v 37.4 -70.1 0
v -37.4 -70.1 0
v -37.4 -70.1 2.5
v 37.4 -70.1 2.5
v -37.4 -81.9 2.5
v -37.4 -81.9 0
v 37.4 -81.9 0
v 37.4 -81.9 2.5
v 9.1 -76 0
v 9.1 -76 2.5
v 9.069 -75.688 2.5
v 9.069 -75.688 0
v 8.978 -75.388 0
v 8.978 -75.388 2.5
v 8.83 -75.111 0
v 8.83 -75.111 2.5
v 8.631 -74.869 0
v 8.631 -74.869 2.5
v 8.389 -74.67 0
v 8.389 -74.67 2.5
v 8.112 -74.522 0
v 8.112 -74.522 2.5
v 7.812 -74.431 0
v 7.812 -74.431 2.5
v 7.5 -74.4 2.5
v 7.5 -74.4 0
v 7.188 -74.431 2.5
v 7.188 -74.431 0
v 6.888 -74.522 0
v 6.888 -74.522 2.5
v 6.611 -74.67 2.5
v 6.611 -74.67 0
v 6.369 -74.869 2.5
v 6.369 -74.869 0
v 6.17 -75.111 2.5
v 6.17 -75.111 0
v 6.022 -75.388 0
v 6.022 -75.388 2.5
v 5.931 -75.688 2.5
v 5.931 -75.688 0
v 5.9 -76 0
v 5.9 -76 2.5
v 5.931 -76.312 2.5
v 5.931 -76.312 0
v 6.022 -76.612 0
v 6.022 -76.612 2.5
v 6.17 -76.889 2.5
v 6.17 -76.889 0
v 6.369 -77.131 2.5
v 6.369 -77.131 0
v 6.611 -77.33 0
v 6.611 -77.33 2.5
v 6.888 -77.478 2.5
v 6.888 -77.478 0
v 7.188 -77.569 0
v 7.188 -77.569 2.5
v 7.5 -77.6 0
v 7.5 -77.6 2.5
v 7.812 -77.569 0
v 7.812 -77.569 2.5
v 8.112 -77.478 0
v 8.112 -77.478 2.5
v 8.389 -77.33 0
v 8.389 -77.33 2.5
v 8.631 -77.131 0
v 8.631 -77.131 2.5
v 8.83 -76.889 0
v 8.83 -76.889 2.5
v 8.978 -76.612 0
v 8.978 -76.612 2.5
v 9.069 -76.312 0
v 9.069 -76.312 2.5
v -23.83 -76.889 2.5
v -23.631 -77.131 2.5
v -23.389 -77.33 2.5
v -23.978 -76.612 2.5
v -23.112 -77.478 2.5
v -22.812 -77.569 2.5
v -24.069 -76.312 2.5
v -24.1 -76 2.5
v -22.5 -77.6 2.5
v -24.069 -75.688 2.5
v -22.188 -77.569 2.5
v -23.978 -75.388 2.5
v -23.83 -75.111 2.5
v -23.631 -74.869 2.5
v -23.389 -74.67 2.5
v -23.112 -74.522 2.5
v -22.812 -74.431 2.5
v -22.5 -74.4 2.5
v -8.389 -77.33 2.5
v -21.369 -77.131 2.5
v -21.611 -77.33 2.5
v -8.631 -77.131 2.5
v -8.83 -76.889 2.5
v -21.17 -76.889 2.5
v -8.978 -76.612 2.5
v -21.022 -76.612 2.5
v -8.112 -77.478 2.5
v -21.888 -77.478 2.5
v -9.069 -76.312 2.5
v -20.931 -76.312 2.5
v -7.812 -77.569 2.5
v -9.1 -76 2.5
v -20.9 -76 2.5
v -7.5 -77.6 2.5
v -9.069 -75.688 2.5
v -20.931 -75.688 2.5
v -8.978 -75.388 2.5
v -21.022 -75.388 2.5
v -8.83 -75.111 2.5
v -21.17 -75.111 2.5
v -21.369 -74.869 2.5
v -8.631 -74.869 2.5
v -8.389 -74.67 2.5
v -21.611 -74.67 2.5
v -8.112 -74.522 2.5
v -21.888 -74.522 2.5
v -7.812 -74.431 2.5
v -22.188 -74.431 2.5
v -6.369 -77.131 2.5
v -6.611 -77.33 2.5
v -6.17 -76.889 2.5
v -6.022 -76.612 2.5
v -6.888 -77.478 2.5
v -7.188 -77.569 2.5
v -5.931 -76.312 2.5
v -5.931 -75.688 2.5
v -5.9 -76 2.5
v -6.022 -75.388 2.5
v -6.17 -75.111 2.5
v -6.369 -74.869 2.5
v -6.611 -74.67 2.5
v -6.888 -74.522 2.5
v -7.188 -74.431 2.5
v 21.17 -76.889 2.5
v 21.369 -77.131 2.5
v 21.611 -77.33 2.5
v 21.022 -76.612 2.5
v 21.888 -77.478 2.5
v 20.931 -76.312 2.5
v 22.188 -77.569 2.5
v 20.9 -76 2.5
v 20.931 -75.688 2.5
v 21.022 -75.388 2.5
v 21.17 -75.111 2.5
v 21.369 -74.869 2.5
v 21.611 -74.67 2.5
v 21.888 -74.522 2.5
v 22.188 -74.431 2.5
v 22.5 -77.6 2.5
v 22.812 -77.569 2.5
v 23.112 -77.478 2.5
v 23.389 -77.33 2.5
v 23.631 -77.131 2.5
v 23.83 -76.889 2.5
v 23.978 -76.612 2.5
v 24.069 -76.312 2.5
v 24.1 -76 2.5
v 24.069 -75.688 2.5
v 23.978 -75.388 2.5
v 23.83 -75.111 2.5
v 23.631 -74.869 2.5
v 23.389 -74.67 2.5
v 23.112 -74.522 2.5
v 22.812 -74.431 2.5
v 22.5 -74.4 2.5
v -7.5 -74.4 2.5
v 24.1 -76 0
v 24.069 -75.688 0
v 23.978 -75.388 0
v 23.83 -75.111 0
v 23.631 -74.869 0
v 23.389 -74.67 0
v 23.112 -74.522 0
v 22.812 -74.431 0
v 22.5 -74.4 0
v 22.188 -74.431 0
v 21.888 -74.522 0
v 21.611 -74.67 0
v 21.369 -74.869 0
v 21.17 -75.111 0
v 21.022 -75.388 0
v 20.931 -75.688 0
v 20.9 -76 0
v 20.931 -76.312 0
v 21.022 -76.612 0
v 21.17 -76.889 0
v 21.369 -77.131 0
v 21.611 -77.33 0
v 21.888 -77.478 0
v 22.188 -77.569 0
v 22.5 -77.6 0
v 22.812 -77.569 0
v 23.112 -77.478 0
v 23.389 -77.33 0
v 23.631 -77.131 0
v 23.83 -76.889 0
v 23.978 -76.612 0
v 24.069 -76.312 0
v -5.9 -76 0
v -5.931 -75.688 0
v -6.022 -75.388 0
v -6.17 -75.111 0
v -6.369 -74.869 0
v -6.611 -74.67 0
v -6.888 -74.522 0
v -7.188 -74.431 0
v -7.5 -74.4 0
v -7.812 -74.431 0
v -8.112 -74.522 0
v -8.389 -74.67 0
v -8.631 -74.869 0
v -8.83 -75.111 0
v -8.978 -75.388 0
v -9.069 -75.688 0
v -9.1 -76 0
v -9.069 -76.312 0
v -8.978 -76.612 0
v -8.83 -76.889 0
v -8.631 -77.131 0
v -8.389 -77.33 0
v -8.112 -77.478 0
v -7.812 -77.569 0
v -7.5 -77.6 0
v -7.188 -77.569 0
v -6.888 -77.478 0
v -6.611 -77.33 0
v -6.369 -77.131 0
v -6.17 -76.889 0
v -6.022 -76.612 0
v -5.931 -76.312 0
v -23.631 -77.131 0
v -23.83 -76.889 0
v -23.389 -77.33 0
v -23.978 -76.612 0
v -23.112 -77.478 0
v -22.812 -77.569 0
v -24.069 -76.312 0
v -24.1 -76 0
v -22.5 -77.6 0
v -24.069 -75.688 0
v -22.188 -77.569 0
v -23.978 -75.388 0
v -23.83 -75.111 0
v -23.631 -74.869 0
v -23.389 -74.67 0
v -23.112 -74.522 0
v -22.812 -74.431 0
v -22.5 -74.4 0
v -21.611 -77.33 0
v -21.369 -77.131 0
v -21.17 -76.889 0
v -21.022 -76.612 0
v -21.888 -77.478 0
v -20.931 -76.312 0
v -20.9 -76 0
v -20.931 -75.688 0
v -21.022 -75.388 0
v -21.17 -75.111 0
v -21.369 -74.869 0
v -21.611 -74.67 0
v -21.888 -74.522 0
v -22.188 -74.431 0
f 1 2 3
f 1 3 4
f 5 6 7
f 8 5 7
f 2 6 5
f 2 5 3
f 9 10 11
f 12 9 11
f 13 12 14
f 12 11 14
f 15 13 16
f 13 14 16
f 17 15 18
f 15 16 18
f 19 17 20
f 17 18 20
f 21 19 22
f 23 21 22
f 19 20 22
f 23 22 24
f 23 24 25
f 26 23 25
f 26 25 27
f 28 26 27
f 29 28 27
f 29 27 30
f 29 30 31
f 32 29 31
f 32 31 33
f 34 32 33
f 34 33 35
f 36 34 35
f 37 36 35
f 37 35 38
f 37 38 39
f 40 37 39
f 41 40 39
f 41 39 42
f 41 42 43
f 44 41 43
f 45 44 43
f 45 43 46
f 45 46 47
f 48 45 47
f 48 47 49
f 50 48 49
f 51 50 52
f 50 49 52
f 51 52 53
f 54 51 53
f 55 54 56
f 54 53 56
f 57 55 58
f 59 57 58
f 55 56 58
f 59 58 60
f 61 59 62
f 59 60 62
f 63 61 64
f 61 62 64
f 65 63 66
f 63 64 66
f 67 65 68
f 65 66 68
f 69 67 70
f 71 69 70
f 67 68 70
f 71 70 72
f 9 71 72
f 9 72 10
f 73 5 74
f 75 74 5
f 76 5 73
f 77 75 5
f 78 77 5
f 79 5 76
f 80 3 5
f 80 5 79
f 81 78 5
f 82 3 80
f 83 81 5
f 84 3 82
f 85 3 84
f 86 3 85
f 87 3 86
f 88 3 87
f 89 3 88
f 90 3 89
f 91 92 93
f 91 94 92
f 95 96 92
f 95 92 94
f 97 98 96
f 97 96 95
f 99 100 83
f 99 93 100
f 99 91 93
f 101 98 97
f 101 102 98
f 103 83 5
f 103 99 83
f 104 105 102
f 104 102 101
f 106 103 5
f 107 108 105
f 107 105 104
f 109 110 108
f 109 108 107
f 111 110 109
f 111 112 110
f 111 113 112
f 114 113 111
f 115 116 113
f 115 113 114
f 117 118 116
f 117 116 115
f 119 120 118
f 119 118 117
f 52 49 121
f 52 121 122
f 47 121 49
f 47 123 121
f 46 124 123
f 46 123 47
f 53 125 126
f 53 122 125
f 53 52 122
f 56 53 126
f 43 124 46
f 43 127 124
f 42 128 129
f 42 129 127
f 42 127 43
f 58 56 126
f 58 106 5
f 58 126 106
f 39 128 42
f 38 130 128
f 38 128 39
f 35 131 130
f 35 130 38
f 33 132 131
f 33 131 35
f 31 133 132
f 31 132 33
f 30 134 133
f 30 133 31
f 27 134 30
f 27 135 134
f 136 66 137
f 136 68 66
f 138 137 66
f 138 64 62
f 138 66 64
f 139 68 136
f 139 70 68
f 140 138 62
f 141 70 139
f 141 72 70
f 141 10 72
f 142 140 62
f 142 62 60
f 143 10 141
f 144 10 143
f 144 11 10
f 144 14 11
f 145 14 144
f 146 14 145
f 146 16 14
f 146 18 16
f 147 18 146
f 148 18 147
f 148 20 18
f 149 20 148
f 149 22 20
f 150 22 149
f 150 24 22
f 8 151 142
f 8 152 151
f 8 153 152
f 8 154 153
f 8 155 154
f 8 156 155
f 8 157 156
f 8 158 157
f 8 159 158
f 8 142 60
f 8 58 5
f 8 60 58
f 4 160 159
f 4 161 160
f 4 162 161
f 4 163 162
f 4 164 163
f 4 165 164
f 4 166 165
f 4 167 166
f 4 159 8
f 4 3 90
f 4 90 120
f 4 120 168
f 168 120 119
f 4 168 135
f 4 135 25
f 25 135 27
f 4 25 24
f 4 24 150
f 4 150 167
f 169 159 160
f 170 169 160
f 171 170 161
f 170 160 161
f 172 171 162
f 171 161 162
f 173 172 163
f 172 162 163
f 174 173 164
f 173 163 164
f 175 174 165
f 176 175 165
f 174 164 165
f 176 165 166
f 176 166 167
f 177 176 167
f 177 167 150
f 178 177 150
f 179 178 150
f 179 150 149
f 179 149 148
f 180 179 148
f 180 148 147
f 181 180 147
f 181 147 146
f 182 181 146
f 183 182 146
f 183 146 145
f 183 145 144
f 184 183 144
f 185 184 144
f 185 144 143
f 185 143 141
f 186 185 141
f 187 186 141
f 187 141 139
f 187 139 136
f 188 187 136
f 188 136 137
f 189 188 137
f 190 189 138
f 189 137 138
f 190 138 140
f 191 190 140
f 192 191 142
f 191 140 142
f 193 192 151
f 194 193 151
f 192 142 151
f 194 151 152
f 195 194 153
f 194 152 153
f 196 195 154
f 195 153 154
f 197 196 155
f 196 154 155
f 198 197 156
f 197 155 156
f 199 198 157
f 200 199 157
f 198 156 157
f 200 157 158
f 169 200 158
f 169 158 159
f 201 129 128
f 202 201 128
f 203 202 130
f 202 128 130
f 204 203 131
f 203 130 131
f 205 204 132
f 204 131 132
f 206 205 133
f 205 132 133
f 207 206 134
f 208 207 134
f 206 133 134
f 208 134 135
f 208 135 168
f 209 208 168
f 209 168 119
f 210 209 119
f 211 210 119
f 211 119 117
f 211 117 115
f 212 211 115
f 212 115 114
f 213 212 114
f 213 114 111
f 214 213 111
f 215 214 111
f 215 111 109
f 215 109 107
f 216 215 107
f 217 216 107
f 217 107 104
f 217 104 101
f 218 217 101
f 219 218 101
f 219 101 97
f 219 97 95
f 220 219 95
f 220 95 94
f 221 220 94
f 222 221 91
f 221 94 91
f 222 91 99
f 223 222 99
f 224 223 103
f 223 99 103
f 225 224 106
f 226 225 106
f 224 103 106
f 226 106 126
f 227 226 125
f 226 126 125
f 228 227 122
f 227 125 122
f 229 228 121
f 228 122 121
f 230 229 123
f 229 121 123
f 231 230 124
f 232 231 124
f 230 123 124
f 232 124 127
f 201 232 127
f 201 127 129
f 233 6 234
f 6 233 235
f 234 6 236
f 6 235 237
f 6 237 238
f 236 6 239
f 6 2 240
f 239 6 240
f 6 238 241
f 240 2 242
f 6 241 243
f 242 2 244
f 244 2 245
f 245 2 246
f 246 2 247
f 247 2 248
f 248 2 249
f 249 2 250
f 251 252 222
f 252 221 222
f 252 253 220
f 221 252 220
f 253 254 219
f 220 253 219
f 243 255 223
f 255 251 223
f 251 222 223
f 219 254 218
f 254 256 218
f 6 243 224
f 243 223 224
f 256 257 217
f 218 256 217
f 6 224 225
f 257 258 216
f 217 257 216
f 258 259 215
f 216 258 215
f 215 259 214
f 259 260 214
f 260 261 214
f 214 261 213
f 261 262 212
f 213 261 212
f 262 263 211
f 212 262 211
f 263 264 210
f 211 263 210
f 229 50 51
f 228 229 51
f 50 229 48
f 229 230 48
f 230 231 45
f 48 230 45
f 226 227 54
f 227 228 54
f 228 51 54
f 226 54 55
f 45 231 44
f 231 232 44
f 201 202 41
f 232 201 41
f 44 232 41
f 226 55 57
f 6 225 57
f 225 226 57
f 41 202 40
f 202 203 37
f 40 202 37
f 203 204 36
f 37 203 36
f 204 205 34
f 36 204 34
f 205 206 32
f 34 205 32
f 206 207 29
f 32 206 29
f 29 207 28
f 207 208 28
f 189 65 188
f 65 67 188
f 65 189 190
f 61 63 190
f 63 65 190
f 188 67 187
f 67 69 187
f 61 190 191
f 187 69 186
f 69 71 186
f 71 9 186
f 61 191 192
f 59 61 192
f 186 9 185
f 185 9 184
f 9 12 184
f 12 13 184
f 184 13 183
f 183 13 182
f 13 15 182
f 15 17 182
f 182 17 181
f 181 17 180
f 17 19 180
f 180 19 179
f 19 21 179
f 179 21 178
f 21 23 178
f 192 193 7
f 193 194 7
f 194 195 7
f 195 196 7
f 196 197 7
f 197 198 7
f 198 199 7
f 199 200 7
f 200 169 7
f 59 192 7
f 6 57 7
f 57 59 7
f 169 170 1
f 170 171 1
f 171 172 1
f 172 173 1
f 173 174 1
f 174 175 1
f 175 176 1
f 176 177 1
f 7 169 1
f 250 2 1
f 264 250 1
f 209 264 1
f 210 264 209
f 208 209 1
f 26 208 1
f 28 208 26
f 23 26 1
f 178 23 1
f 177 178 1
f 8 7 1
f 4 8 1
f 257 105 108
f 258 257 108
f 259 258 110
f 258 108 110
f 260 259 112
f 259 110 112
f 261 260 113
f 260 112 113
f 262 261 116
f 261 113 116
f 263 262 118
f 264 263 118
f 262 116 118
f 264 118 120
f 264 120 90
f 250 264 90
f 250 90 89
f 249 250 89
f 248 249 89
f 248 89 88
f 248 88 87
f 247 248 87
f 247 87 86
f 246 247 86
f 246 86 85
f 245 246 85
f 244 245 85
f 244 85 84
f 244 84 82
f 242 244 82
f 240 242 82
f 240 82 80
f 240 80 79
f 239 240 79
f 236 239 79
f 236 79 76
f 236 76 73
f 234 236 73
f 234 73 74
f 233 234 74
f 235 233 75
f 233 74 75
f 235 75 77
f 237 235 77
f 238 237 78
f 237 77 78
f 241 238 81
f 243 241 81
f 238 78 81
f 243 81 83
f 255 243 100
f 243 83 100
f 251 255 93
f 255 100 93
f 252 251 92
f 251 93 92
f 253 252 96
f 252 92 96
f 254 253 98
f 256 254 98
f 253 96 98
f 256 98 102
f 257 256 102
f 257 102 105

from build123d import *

# Parameters (mm, degrees)
CROQUIS1_W              = 74.8
CROQUIS1_H              = 11.8
SALIENTE_EXTRUIR1_DEPTH = 2.5
CORTAR_EXTRUIR1_REACH   = 4.5
CROQUIS2_R              = 1.6


with BuildPart() as part:
    # Croquis1 → Saliente-Extruir1 (new body)
    with BuildSketch(Plane.XY):
        with Locations((0, -76)):
            Rectangle(CROQUIS1_W, CROQUIS1_H)
    extrude(amount=SALIENTE_EXTRUIR1_DEPTH)

    # Croquis2 → Cortar-Extruir1 (cut, up to next)
    with BuildSketch(Plane.XY.offset(2.5), mode=Mode.PRIVATE) as cortar_extruir1_sk1:
        with Locations((-22.5, -76)):
            Circle(CROQUIS2_R)
    cortar_extruir1_tool1 = extrude(cortar_extruir1_sk1.sketch, amount=-CORTAR_EXTRUIR1_REACH, mode=Mode.PRIVATE) & part.part
    add(cortar_extruir1_tool1.solids().sort_by_distance((-22.5, -76, 2.5))[0], mode=Mode.SUBTRACT)
    # Croquis2 → Cortar-Extruir1 (cut, up to next)
    with BuildSketch(Plane.XY.offset(2.5), mode=Mode.PRIVATE) as cortar_extruir1_sk2:
        with Locations((22.5, -76)):
            Circle(CROQUIS2_R)
    cortar_extruir1_tool2 = extrude(cortar_extruir1_sk2.sketch, amount=-CORTAR_EXTRUIR1_REACH, mode=Mode.PRIVATE) & part.part
    add(cortar_extruir1_tool2.solids().sort_by_distance((22.5, -76, 2.5))[0], mode=Mode.SUBTRACT)
    # Croquis2 → Cortar-Extruir1 (cut, up to next)
    with BuildSketch(Plane.XY.offset(2.5), mode=Mode.PRIVATE) as cortar_extruir1_sk3:
        with Locations((-7.5, -76)):
            Circle(CROQUIS2_R)
    cortar_extruir1_tool3 = extrude(cortar_extruir1_sk3.sketch, amount=-CORTAR_EXTRUIR1_REACH, mode=Mode.PRIVATE) & part.part
    add(cortar_extruir1_tool3.solids().sort_by_distance((-7.5, -76, 2.5))[0], mode=Mode.SUBTRACT)
    # Croquis2 → Cortar-Extruir1 (cut, up to next)
    with BuildSketch(Plane.XY.offset(2.5), mode=Mode.PRIVATE) as cortar_extruir1_sk4:
        with Locations((7.5, -76)):
            Circle(CROQUIS2_R)
    cortar_extruir1_tool4 = extrude(cortar_extruir1_sk4.sketch, amount=-CORTAR_EXTRUIR1_REACH, mode=Mode.PRIVATE) & part.part
    add(cortar_extruir1_tool4.solids().sort_by_distance((7.5, -76, 2.5))[0], mode=Mode.SUBTRACT)


solid = part.part
